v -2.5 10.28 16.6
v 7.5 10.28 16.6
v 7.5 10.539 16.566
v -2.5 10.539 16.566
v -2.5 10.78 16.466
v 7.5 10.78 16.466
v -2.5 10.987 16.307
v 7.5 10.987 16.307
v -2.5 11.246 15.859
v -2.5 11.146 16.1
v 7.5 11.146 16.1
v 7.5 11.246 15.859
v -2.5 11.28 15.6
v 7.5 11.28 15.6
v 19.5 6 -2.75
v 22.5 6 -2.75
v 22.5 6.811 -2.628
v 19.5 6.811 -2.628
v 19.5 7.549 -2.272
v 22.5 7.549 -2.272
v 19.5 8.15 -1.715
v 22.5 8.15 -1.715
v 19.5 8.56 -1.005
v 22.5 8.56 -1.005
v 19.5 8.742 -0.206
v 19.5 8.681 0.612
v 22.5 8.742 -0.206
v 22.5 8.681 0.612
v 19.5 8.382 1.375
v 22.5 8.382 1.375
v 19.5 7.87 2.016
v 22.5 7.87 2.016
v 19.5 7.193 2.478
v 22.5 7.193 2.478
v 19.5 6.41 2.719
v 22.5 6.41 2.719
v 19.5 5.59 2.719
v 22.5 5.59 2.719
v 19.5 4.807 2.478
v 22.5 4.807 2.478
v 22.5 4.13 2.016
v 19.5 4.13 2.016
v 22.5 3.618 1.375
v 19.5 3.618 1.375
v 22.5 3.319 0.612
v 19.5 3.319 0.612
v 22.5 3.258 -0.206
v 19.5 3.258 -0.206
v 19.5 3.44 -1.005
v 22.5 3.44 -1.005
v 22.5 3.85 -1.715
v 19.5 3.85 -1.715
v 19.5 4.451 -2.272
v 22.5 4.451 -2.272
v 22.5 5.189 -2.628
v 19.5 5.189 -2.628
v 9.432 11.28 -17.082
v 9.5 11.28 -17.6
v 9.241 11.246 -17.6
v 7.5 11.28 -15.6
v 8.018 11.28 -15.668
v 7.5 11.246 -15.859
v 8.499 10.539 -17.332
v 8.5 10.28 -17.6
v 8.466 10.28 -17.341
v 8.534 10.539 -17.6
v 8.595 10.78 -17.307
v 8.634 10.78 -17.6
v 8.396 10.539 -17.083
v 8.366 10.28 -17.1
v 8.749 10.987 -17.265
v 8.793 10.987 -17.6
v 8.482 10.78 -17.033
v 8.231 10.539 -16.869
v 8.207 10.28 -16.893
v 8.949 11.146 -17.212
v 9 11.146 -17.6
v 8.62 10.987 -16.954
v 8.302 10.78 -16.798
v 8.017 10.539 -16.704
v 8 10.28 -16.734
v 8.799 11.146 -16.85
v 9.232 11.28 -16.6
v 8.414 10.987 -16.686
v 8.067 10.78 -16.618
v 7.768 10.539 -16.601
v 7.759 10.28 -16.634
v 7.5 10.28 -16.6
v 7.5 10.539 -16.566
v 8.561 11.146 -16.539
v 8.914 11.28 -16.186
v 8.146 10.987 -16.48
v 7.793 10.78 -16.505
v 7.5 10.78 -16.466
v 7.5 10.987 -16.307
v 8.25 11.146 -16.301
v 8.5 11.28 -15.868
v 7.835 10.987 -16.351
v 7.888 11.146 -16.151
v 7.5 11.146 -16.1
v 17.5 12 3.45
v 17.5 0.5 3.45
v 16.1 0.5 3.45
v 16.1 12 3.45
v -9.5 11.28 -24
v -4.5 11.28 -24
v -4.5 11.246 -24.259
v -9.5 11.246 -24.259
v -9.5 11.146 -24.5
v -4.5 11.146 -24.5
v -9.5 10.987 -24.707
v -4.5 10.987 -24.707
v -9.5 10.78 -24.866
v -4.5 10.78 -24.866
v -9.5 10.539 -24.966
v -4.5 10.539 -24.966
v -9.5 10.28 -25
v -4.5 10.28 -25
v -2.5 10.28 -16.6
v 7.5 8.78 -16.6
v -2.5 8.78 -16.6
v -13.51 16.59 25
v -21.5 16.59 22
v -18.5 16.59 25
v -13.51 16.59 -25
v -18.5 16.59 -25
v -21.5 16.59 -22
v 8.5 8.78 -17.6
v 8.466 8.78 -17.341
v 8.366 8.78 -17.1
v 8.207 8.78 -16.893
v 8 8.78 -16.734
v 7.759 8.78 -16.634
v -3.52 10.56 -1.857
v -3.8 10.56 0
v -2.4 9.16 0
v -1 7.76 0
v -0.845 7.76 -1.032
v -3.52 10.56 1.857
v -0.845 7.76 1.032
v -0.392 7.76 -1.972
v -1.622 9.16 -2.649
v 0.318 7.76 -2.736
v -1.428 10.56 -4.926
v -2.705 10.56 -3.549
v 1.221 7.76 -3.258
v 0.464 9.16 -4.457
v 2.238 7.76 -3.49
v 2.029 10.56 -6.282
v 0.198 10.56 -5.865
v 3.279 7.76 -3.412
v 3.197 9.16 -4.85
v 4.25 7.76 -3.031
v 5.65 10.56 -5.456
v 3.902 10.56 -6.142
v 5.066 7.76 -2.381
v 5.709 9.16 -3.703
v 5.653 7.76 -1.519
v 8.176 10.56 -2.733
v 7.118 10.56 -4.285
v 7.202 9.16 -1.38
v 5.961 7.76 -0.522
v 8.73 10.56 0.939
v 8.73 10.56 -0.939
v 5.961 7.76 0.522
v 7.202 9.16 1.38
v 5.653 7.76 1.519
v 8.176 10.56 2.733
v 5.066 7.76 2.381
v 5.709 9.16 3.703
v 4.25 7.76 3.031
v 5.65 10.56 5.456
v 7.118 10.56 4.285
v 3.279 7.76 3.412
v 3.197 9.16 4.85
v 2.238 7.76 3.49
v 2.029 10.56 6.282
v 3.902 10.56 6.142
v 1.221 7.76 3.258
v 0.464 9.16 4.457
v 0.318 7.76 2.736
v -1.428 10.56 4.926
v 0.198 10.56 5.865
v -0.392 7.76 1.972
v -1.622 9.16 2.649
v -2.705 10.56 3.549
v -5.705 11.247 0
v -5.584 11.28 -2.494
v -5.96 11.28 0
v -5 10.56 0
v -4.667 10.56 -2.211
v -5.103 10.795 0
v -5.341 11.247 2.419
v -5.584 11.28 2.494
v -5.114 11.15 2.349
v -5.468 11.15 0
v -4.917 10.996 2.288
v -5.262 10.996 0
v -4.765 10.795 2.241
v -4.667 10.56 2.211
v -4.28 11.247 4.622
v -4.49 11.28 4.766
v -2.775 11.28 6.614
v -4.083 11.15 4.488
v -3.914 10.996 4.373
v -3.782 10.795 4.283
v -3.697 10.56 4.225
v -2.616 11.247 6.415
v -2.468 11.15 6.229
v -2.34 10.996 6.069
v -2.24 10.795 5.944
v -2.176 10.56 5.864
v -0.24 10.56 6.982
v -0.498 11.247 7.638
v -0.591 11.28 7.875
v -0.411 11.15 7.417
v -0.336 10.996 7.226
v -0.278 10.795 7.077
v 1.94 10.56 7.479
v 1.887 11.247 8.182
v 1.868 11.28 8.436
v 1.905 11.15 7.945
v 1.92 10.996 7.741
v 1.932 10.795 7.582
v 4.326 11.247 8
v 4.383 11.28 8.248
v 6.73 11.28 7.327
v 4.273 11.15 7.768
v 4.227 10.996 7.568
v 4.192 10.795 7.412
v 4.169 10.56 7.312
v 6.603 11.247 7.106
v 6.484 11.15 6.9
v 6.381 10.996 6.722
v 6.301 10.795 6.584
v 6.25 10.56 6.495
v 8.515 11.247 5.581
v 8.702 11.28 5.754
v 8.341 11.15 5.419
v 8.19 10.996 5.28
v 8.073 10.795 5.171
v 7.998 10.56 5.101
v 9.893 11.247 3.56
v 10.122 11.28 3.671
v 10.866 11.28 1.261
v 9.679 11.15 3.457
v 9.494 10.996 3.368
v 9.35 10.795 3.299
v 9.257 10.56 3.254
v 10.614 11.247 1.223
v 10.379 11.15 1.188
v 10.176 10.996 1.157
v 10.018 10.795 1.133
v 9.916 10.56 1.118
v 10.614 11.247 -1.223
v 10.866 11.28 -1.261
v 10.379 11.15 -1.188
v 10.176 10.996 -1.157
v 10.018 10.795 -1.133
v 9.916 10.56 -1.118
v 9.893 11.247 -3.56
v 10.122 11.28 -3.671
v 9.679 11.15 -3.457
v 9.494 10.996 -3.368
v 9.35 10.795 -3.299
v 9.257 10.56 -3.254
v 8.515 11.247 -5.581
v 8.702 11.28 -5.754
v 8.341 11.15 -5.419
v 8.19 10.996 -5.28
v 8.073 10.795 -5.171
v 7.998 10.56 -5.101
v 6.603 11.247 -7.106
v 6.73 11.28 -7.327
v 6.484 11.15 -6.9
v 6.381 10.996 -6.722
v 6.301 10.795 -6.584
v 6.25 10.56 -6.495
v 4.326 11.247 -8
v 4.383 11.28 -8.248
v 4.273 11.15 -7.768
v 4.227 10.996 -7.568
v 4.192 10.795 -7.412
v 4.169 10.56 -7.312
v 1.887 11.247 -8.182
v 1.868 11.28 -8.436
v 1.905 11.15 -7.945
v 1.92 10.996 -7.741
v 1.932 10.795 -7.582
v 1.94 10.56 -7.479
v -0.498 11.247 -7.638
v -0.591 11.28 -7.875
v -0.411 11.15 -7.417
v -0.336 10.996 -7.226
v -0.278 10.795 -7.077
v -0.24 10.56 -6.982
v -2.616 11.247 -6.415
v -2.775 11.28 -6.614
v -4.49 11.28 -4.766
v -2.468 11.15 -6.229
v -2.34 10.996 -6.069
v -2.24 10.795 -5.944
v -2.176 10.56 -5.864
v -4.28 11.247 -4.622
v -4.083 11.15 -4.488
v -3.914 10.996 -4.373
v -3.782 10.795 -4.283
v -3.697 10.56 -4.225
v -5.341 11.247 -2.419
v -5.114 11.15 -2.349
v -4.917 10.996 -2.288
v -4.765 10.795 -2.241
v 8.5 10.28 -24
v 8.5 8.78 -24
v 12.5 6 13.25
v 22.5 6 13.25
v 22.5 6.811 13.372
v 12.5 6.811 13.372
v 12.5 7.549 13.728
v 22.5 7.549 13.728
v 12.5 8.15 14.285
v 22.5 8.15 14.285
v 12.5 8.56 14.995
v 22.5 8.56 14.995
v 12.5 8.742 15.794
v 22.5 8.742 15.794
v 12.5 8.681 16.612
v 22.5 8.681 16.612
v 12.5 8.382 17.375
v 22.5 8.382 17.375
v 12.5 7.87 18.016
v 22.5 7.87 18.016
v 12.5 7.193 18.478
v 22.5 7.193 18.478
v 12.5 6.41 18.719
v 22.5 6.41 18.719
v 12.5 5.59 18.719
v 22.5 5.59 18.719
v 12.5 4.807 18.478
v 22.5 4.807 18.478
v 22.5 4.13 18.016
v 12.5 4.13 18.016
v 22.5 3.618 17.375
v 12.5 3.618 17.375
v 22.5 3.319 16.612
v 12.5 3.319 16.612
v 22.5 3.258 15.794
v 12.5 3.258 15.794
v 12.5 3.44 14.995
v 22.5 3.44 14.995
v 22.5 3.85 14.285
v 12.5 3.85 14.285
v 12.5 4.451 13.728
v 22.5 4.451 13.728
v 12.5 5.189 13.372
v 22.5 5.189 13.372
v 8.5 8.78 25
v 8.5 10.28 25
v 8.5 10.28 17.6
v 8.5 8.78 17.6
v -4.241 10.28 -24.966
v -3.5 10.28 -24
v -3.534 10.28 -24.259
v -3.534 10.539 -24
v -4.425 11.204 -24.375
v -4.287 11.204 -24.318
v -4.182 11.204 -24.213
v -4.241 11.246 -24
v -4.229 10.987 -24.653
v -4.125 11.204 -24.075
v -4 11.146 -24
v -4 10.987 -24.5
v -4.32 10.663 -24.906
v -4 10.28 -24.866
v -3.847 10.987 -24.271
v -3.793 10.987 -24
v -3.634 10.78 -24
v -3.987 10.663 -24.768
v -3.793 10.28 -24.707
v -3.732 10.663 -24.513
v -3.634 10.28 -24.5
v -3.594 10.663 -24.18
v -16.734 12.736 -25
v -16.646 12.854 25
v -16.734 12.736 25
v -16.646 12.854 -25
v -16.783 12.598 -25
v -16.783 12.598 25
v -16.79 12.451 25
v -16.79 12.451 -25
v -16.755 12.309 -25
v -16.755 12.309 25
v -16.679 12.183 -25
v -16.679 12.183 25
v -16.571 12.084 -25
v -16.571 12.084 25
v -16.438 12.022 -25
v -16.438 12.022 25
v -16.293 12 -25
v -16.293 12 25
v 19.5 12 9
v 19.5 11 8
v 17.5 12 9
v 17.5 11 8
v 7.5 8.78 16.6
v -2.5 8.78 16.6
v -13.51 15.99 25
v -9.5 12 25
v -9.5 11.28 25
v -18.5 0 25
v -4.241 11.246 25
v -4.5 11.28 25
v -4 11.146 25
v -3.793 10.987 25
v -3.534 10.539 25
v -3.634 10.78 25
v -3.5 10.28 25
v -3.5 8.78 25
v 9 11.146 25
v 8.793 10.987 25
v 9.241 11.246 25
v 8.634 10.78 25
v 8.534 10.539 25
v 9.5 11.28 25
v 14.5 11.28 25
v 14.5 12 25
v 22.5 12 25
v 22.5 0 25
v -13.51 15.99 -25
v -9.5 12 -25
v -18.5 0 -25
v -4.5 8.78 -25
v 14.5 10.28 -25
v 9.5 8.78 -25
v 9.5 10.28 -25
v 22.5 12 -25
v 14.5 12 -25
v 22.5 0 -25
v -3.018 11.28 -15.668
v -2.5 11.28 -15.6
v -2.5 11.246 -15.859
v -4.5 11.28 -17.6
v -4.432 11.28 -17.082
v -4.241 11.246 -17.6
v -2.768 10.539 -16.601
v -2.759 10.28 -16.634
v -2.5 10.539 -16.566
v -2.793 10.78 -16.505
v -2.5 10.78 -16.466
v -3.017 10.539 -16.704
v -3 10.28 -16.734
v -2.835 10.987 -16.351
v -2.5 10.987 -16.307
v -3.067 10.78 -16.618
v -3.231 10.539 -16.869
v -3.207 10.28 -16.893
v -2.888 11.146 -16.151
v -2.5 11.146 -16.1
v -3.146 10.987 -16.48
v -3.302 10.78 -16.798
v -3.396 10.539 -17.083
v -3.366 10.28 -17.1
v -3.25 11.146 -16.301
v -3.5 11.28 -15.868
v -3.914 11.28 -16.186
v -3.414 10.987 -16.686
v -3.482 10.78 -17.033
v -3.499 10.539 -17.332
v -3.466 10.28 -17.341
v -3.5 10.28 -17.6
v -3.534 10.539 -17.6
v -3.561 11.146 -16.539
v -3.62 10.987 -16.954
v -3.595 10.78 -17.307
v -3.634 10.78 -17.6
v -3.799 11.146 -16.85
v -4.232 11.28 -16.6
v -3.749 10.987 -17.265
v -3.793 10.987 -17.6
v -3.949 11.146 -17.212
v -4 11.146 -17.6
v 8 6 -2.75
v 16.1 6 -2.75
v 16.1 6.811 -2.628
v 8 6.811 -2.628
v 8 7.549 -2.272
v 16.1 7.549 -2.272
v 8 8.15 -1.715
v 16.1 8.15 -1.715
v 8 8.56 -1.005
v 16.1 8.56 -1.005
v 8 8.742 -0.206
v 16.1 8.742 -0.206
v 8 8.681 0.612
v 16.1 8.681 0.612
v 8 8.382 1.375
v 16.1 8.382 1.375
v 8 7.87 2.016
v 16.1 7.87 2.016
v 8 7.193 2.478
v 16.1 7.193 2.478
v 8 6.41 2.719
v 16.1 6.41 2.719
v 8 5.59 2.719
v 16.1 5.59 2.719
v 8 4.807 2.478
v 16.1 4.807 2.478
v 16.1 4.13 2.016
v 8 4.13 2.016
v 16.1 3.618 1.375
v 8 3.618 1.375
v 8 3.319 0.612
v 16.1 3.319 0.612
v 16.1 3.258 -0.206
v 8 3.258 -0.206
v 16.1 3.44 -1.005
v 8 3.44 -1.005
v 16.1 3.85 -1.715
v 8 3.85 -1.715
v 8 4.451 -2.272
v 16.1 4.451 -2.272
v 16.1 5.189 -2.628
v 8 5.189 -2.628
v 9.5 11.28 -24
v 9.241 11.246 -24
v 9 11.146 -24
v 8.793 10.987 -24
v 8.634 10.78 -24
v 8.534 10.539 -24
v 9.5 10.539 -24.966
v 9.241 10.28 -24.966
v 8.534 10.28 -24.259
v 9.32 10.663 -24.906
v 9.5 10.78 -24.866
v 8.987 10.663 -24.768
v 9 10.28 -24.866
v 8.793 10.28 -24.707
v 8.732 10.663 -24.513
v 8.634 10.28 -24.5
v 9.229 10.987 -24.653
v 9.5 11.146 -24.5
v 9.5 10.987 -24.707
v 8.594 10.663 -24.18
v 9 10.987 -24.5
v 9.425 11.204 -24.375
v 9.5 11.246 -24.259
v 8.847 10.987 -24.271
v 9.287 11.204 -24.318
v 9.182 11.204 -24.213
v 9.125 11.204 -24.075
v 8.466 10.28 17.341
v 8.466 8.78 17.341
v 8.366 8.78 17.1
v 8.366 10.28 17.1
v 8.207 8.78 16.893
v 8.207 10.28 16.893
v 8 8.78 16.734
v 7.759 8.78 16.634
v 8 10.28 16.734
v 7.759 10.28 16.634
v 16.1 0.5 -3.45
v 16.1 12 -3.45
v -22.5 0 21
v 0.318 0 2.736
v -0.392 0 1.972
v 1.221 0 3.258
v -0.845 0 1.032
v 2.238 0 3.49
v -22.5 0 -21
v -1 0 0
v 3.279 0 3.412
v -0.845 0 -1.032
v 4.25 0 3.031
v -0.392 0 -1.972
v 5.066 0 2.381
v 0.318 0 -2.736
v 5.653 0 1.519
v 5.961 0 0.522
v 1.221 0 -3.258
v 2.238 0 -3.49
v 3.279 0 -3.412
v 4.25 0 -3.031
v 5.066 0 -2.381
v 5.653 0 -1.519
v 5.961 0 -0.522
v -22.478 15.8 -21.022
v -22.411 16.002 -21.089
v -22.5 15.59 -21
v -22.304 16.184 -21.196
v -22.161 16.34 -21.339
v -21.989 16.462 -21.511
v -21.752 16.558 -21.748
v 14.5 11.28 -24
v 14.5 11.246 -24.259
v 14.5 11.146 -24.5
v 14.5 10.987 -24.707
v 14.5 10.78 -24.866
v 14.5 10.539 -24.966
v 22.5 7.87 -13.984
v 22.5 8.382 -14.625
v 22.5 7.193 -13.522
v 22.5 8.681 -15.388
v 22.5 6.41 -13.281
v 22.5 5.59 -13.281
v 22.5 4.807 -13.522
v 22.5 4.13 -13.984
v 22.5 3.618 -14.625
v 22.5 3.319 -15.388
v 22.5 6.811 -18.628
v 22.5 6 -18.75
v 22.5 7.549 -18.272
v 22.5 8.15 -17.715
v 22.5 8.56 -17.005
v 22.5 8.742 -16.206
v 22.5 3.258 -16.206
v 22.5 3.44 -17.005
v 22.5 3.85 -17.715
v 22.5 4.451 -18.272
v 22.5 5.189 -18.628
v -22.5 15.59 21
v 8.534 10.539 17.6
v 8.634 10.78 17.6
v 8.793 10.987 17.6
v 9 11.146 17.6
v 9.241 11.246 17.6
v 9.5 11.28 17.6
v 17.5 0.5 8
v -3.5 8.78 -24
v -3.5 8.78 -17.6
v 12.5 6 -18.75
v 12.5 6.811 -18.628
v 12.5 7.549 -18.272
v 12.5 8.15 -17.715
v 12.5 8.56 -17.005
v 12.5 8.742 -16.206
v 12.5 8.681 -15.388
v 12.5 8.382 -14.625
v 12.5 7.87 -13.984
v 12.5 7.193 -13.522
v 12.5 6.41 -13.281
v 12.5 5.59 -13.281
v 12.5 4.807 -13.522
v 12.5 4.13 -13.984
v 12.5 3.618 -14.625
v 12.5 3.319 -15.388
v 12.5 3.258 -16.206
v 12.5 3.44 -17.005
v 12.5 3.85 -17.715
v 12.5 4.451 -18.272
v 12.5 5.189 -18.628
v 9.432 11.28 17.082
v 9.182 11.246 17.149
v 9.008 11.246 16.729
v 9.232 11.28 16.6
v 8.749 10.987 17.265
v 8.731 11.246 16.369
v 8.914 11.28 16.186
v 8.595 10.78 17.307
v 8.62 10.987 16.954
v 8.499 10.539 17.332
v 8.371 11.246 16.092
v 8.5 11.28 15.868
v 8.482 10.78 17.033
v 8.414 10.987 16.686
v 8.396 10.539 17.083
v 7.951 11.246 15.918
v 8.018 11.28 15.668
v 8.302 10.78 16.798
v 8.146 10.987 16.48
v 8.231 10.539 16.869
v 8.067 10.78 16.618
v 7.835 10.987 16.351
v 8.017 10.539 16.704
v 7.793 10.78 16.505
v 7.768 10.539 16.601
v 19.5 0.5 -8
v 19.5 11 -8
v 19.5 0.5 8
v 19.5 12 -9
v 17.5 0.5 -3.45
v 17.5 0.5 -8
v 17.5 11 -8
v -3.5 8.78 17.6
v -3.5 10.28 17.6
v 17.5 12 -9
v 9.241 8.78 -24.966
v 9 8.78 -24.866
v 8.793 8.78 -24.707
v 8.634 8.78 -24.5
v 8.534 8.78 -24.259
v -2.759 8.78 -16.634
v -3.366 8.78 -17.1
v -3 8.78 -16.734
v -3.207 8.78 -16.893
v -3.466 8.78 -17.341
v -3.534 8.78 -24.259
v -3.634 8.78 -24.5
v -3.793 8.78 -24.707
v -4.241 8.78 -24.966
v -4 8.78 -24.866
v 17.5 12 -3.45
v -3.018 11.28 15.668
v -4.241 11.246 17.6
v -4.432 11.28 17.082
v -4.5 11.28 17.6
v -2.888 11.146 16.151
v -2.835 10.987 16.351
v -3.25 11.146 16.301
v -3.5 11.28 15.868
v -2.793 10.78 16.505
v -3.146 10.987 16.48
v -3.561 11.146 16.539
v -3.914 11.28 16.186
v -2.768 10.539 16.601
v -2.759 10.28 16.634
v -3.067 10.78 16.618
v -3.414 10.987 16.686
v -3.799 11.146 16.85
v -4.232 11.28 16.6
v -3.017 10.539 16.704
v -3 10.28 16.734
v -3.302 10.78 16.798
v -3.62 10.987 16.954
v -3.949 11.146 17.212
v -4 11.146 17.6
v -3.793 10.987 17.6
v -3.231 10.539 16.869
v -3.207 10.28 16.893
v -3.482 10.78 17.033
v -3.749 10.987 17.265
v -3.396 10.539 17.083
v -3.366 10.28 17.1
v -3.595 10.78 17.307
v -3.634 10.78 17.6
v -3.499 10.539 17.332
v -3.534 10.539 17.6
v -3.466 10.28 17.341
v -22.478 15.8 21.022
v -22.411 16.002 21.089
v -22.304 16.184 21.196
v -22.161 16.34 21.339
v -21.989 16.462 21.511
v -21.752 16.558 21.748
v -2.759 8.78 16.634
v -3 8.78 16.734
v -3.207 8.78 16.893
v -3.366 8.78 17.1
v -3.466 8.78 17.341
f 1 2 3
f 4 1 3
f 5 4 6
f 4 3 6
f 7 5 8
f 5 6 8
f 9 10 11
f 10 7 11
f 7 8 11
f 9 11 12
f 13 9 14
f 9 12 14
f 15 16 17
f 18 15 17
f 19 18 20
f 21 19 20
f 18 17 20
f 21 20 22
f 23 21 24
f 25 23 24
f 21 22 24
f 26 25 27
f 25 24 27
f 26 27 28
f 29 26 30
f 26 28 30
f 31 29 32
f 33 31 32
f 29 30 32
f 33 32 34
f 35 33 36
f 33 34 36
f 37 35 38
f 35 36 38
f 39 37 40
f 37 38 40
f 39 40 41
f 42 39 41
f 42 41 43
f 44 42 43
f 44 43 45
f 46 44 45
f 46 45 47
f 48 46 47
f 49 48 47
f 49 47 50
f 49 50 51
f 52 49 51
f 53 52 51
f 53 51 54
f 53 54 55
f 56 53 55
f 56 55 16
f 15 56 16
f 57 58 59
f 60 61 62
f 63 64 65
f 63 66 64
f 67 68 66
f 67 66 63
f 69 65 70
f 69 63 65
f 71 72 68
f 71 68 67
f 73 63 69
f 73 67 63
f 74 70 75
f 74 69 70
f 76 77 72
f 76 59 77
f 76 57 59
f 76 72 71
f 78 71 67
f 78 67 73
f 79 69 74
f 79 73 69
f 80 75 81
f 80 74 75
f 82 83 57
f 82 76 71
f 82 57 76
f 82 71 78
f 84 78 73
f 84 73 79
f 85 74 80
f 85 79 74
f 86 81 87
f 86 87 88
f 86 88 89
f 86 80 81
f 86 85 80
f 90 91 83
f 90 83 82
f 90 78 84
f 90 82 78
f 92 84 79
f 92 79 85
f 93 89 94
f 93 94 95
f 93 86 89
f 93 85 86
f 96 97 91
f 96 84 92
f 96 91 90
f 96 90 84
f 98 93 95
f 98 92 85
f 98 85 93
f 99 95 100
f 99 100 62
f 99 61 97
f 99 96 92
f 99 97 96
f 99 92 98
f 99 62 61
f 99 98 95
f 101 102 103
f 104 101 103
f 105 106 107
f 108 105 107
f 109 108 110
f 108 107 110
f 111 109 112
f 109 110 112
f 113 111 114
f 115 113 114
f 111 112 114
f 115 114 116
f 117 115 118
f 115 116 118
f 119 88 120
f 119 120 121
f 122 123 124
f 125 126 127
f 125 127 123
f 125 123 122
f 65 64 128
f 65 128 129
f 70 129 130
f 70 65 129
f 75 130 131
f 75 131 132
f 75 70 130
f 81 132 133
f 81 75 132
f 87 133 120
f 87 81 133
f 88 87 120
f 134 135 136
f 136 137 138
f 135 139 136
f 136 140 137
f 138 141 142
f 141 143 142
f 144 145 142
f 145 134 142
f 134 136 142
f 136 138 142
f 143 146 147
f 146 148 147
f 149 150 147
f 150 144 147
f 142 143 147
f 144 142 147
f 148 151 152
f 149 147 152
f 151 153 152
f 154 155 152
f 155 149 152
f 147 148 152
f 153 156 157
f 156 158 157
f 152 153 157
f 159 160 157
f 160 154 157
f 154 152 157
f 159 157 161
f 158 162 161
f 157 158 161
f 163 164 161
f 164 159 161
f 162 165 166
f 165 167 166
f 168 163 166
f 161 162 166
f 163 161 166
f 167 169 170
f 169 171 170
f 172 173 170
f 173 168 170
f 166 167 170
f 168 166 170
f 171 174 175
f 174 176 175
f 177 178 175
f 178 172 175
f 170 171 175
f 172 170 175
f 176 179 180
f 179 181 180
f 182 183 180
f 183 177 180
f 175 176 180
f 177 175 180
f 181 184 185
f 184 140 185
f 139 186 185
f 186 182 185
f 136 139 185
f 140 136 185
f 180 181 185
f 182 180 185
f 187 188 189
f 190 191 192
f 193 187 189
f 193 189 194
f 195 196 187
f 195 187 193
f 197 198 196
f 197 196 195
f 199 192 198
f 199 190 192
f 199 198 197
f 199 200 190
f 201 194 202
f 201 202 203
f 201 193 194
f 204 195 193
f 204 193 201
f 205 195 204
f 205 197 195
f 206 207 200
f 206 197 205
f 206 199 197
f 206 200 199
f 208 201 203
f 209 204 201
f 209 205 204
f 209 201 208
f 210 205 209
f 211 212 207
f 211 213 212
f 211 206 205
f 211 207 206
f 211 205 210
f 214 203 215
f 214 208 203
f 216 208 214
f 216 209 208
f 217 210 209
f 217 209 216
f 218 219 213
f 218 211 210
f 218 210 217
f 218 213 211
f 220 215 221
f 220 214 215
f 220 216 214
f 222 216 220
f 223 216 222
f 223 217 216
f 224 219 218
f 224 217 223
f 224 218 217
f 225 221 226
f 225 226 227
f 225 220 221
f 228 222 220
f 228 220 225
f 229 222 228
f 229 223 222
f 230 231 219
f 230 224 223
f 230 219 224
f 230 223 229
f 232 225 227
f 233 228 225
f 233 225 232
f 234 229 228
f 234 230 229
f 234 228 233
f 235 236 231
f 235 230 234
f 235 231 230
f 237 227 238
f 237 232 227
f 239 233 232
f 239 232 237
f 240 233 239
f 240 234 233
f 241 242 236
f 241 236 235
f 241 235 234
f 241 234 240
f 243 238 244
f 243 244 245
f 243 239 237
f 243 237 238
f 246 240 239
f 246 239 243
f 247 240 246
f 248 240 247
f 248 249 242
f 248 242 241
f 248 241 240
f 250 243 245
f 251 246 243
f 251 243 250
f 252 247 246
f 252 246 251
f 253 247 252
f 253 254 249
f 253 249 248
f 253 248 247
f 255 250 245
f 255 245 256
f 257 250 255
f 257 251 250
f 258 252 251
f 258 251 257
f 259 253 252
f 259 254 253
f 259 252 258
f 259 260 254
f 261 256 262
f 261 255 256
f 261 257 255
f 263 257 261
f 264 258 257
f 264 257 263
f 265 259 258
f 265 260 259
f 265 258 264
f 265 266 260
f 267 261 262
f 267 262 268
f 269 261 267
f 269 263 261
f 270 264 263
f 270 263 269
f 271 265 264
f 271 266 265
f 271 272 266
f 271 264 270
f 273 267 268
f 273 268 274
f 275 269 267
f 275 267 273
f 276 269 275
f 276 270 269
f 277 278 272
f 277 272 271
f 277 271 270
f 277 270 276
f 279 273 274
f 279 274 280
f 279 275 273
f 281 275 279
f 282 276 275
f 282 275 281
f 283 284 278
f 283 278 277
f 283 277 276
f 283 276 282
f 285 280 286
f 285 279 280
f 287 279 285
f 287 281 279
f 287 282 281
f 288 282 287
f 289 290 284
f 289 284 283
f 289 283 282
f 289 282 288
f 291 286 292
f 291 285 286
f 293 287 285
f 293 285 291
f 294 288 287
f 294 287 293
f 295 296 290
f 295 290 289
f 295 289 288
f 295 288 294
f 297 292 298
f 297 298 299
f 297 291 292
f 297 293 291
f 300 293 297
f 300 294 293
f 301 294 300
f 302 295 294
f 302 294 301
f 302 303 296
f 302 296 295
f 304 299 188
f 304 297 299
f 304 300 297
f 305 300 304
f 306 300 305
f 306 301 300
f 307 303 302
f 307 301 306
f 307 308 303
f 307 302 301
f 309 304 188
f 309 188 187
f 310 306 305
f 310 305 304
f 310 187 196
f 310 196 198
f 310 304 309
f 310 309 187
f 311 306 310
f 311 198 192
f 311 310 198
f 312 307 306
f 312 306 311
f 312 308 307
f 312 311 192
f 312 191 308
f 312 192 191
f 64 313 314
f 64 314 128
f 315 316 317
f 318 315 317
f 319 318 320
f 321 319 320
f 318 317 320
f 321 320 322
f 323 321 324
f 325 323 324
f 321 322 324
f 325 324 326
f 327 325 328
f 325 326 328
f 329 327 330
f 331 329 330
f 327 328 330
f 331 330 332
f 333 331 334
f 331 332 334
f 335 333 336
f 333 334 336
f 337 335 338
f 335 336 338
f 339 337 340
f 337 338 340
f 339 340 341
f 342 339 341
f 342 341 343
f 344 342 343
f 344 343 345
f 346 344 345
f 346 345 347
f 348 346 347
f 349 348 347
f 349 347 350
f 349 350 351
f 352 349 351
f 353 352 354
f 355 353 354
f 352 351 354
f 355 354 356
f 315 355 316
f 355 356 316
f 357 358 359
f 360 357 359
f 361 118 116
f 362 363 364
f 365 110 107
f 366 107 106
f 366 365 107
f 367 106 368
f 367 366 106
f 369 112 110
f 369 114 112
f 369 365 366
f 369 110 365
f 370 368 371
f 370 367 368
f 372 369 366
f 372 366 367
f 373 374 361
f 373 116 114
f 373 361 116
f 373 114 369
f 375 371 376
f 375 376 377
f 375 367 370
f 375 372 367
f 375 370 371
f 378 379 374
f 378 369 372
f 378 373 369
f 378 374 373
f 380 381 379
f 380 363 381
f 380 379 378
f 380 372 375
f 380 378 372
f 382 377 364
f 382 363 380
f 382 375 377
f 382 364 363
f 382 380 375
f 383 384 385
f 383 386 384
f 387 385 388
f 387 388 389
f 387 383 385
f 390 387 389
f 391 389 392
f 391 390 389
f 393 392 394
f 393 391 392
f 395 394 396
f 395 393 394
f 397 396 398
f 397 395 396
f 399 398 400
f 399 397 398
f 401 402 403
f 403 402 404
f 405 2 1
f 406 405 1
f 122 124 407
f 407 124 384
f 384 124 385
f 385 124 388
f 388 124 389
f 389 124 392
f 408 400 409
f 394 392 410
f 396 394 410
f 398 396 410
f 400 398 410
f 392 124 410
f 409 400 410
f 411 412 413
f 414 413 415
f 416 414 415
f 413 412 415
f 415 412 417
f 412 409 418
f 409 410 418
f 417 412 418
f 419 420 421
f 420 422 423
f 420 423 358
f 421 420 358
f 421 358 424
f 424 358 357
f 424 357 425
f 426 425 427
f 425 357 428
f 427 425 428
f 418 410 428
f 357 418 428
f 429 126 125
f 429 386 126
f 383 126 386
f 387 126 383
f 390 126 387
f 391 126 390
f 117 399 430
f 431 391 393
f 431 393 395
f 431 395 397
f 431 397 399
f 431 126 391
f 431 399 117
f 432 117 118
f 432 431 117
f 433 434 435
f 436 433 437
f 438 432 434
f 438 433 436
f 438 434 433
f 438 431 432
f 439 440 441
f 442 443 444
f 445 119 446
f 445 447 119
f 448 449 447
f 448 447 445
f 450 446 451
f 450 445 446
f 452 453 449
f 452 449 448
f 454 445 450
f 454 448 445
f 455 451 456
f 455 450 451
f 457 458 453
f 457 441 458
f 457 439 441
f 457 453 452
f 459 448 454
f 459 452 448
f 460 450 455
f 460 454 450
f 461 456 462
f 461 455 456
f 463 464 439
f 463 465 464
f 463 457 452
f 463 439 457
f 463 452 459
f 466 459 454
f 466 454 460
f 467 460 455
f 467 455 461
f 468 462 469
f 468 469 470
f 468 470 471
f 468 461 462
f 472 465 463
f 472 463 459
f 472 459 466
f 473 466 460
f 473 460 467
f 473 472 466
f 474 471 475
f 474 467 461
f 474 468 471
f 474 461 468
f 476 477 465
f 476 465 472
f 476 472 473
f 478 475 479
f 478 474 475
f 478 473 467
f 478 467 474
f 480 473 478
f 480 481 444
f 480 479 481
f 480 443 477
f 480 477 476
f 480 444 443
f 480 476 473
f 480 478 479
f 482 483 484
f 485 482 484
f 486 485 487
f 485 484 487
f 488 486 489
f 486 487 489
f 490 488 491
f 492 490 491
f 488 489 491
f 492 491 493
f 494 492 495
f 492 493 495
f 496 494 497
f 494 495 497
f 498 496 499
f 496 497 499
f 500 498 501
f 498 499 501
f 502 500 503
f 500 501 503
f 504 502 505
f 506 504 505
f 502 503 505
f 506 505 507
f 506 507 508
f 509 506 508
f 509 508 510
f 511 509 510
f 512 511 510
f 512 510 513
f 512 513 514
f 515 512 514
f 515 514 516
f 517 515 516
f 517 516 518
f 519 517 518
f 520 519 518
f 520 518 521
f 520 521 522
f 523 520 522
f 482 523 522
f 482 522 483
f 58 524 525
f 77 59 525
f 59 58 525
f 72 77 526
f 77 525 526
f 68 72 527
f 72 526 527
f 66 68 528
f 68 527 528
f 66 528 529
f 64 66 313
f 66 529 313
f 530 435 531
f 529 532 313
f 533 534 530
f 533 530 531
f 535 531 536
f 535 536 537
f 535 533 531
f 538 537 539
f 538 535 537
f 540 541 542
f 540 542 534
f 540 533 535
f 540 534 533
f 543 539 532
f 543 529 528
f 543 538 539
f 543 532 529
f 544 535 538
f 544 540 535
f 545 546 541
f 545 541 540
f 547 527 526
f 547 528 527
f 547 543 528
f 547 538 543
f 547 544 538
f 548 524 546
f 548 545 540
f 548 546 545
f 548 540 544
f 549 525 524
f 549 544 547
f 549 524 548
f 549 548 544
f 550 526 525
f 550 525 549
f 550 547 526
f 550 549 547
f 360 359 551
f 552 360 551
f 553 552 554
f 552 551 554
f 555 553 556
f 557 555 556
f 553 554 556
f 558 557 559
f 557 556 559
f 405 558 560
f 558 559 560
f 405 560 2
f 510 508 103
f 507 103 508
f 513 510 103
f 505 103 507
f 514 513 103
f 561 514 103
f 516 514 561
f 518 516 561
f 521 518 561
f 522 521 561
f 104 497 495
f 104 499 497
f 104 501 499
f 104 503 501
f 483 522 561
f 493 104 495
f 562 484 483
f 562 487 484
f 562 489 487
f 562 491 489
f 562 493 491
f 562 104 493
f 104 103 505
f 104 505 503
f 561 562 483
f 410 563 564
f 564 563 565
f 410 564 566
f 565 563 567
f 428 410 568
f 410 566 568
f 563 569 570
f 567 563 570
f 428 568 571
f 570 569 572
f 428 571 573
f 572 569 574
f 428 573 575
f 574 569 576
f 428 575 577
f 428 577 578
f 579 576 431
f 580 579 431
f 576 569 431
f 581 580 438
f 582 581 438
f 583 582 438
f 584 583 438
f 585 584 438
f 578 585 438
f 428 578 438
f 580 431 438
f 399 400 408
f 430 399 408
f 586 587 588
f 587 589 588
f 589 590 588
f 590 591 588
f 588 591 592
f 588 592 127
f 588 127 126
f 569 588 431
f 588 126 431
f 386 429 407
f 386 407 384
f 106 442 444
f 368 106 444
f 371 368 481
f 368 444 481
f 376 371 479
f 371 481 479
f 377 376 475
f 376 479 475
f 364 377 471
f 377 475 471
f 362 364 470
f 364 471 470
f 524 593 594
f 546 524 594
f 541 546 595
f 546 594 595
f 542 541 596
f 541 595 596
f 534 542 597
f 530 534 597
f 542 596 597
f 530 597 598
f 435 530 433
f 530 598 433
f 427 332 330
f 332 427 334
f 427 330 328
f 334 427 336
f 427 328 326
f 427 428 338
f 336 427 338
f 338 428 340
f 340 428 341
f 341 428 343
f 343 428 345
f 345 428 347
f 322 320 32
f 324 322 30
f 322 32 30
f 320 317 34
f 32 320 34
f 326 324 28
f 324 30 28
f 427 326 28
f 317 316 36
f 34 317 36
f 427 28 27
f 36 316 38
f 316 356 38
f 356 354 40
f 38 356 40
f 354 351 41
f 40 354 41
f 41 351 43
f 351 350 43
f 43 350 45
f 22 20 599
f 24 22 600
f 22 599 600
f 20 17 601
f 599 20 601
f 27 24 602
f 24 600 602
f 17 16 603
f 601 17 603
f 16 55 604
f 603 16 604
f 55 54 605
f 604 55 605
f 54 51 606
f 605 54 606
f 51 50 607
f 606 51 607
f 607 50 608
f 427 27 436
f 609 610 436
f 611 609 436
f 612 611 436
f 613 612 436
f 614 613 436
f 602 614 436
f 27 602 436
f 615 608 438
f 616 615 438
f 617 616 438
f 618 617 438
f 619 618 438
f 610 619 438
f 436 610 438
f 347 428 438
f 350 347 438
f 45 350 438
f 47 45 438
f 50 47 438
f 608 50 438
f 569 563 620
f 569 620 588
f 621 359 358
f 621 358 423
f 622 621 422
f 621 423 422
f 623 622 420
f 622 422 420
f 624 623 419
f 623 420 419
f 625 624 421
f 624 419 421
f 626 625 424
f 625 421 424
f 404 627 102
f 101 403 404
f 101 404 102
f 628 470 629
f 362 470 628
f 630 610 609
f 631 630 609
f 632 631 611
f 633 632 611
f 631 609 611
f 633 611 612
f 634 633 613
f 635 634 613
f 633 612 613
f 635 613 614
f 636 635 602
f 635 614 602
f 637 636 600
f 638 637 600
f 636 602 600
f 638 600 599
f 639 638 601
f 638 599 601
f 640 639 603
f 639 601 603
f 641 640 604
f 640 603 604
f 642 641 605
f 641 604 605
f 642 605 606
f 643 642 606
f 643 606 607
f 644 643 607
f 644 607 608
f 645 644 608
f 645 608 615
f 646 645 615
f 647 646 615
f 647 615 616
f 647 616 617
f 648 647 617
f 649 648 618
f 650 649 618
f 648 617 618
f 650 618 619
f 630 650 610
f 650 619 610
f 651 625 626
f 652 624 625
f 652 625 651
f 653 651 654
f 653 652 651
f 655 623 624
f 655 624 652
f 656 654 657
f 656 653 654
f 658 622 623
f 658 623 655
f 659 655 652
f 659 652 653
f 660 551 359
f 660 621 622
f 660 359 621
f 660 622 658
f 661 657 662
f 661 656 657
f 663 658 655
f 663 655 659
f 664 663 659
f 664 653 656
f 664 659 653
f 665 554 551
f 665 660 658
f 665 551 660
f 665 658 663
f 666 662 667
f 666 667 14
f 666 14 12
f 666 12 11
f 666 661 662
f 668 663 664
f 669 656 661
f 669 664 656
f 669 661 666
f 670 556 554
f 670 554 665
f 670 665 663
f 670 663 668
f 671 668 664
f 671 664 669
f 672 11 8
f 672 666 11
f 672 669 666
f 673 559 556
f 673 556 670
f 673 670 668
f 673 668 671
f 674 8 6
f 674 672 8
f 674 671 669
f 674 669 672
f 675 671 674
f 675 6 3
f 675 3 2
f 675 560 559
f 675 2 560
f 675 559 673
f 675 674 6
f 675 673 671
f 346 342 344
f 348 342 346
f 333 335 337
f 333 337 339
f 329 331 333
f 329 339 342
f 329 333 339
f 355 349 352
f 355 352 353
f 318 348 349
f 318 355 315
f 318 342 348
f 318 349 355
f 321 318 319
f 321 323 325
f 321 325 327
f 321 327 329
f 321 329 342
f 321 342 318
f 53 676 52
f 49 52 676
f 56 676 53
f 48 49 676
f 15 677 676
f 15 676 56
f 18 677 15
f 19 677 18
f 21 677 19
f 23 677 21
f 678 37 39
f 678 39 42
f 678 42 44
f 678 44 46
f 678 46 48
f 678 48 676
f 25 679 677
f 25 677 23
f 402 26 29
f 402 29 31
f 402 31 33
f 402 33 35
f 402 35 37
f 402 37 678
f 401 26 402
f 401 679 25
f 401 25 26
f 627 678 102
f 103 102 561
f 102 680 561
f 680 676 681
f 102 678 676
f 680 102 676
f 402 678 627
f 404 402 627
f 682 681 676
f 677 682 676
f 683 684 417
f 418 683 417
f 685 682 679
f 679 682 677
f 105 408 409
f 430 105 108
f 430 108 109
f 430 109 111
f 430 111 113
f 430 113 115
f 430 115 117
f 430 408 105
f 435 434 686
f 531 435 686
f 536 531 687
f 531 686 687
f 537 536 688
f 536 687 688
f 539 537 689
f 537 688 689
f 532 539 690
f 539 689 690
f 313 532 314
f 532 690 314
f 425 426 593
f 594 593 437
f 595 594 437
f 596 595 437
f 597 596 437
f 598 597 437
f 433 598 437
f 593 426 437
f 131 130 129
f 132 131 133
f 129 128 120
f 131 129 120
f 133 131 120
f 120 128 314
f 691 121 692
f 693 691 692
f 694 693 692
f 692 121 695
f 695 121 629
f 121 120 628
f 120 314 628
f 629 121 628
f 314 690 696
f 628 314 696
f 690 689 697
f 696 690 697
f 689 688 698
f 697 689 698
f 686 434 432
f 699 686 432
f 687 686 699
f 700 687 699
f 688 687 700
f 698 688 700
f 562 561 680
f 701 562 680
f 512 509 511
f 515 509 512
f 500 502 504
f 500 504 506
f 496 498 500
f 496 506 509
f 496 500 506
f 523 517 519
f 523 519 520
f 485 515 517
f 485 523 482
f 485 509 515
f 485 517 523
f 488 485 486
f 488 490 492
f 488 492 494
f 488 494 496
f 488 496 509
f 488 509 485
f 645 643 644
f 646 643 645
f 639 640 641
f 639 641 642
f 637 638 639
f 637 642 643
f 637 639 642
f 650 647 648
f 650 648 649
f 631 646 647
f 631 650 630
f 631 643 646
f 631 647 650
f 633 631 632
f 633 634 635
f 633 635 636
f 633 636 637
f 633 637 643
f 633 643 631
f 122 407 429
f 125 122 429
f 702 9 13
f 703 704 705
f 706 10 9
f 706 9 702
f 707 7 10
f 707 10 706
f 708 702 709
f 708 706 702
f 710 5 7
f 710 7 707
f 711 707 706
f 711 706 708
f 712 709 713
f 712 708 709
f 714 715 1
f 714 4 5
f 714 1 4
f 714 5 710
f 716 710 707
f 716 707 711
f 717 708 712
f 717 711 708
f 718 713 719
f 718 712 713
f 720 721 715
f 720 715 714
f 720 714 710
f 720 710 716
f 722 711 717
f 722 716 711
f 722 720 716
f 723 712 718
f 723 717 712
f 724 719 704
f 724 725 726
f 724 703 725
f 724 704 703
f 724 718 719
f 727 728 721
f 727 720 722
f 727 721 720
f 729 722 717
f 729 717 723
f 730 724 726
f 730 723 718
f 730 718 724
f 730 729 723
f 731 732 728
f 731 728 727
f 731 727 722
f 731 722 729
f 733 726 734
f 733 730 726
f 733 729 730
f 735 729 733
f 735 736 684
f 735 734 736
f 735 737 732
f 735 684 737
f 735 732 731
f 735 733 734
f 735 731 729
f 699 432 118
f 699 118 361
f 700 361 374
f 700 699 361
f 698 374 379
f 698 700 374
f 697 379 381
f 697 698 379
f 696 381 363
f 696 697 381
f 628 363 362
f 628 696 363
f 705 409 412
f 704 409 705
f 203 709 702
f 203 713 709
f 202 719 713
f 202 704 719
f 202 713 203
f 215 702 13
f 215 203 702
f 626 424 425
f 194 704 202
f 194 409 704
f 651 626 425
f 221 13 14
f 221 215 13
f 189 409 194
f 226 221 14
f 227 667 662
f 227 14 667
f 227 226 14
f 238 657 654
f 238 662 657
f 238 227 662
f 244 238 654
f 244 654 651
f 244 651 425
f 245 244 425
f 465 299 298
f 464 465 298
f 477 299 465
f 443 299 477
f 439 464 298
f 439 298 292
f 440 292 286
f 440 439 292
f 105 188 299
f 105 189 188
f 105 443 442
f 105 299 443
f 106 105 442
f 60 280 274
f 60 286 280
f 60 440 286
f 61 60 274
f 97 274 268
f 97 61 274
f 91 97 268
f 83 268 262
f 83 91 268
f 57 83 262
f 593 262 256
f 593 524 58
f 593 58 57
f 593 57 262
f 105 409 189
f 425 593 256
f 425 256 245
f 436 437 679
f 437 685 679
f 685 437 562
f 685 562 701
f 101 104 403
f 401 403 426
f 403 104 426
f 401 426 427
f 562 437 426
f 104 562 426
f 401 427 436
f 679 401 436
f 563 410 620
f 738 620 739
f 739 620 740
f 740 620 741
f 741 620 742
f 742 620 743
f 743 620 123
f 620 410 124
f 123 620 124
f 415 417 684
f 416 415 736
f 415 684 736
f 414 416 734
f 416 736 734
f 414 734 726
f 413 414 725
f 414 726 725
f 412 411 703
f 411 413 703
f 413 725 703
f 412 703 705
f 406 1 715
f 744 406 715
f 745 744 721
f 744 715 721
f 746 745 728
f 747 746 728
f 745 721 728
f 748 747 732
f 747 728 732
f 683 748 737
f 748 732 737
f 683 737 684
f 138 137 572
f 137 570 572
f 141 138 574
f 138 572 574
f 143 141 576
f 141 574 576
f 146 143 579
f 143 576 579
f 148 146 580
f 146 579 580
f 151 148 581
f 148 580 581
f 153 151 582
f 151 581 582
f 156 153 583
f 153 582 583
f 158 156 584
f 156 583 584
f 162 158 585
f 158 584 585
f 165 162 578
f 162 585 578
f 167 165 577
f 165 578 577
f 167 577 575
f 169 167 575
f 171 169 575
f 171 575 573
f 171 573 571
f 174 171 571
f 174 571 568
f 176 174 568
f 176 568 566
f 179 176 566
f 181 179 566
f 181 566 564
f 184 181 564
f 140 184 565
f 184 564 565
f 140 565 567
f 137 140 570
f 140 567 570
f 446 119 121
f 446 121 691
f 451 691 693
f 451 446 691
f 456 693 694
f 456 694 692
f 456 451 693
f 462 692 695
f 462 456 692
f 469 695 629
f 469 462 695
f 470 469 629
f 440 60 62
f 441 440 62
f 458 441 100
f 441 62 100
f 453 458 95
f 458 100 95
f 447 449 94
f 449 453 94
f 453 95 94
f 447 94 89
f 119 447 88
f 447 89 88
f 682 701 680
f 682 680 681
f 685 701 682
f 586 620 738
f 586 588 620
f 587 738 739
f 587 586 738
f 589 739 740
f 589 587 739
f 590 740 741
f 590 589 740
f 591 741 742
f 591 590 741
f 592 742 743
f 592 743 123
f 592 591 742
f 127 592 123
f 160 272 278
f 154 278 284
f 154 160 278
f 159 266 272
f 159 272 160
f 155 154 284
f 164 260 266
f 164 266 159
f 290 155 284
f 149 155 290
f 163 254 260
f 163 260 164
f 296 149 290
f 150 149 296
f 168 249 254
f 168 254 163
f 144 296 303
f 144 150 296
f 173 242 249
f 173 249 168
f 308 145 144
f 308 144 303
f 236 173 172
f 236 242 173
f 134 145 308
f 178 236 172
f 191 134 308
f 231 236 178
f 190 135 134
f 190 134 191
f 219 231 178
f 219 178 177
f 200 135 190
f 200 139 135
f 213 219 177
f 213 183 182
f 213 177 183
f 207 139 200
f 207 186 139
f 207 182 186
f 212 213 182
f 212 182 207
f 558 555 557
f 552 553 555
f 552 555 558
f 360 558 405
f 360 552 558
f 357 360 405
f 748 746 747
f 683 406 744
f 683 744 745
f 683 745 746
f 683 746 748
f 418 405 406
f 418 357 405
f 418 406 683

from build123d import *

# Parameters (mm, degrees)
SKETCH1_W                                       = 45
SKETCH1_H                                       = 50
BOSS_EXTRUDE1_DEPTH                             = 16
CUT_EXTRUDE1_DEPTH                              = 58.116109812
SKETCH4_W                                       = 24
SKETCH4_H                                       = 50
CUT_EXTRUDE2_DEPTH                              = 0.72
CUT_EXTRUDE3_DEPTH                              = 58.116109812
SKETCH8_R                                       = 7.5
CUT_EXTRUDE4_DEPTH                              = 0.72
CSK_FOR_M6_FLAT_HEAD_MACHINE_SCREW1_D           = 7
CSK_FOR_M6_FLAT_HEAD_MACHINE_SCREW1_CSINK_D     = 12.6
CSK_FOR_M6_FLAT_HEAD_MACHINE_SCREW1_CSINK_ANGLE = 90
CUT_EXTRUDE5_DEPTH                              = 2.5
FILLET1_R                                       = 1
FILLET2_R                                       = 1
FILLET4_R                                       = 0.5
CUT_EXTRUDE7_DEPTH                              = 11.5
SKETCH18_R                                      = 2.75
CUT_EXTRUDE8_DEPTH                              = 14.5
SKETCH19_R                                      = 2.75
CUT_EXTRUDE9_DEPTH                              = 10
SKETCH21_W                                      = 8.99
SKETCH21_H                                      = 50
BOSS_EXTRUDE2_DEPTH                             = 0.6
CHAMFER1_SIZE                                   = 4
FILLET5_R                                       = 1
CHAMFER2_SIZE                                   = 1


with BuildPart() as part:
    # Sketch1 → Boss-Extrude1 (new body)
    with BuildSketch(Plane(origin=(0, 0, 0), x_dir=(1, 0, 0), z_dir=(0, 1, 0))):
        Rectangle(SKETCH1_W, SKETCH1_H)
    extrude(amount=BOSS_EXTRUDE1_DEPTH)

    # Sketch3 → Cut-Extrude1 (cut, through all)
    with BuildSketch(Plane.XY.offset(25)):
        Polygon((-13.5, 16), (-17.5, 12), (22.5, 12), (22.5, 16), align=None)
    extrude(amount=-CUT_EXTRUDE1_DEPTH, mode=Mode.SUBTRACT)

    # Sketch4 → Cut-Extrude2 (cut)
    with BuildSketch(Plane(origin=(0, 12, 0), x_dir=(1, 0, 0), z_dir=(0, 1, 0))):
        with Locations((2.5, 0)):
            Rectangle(SKETCH4_W, SKETCH4_H)
    extrude(amount=-CUT_EXTRUDE2_DEPTH, mode=Mode.SUBTRACT)

    # Sketch5 → Cut-Extrude3 (cut, through all)
    with BuildSketch(Plane.XY.offset(25)):
        Polygon((-22.5, 16), (-13.5, 16), (-13.51, 15.99), (-22.5, 15.99), align=None)
    extrude(amount=-CUT_EXTRUDE3_DEPTH, mode=Mode.SUBTRACT)

    # Sketch8 → Cut-Extrude4 (cut)
    with BuildSketch(Plane(origin=(0, 11.28, 0), x_dir=(1, 0, 0), z_dir=(0, 1, 0))):
        with Locations(Location((2.5, 0, 0), (0, 0, 180))):
            Circle(SKETCH8_R)
    extrude(amount=-CUT_EXTRUDE4_DEPTH, mode=Mode.SUBTRACT)

    # CSK for M6 Flat Head Machine Screw1 (through all)
    with Locations(Plane(origin=(0, 10.56, 0), x_dir=(1, 0, 0), z_dir=(0, 1, 0))):
        with Locations((2.5, 0)):
            CounterSinkHole(CSK_FOR_M6_FLAT_HEAD_MACHINE_SCREW1_D / 2, CSK_FOR_M6_FLAT_HEAD_MACHINE_SCREW1_CSINK_D / 2, counter_sink_angle=CSK_FOR_M6_FLAT_HEAD_MACHINE_SCREW1_CSINK_ANGLE)

    # Sketch12 → Cut-Extrude5 (cut)
    with BuildSketch(Plane(origin=(0, 11.28, 0), x_dir=(1, 0, 0), z_dir=(0, 1, 0))):
        with BuildLine():
            Line((7.5, 16.6), (-2.5, 16.6))
            ThreePointArc((-2.5, 16.6), (-3.207106781, 16.892893219), (-3.5, 17.6))
            Line((-3.5, 17.6), (-3.5, 25))
            Line((-3.5, 25), (8.5, 25))
            Line((8.5, 25), (8.5, 17.6))
            ThreePointArc((8.5, 17.6), (8.207106781, 16.892893219), (7.5, 16.6))
        make_face()
    cut_extrude5 = extrude(amount=-CUT_EXTRUDE5_DEPTH, mode=Mode.SUBTRACT)

    # Fillet1
    fillet1_edges = [part.edges().sort_by_distance(p)[0] for p in [
        (-3.5, 10.03, -25),
        (8.5, 10.03, -25),
    ]]
    fillet(fillet1_edges, radius=FILLET1_R)

    # Mirror2: Cut-Extrude5 across plane
    add(cut_extrude5.mirror(Plane.XY), mode=Mode.SUBTRACT)

    # Fillet2
    # the kernel refuses this fillet: 1 mm, written as the material it takes off along each edge
    with BuildSketch(Plane(origin=(7.5, 11.28, 17.6), x_dir=(1, 0, 0), z_dir=(0, 0, 1))) as fillet2_piece_1:
        with BuildLine():
            CenterArc((1 + FILLET2_R, -FILLET2_R), FILLET2_R, 90, 90)
            Line((1, -FILLET2_R), (1 - FILLET2_R * 0.02, -FILLET2_R))
            Line((1 - FILLET2_R * 0.02, -FILLET2_R), (1 - FILLET2_R * 0.02, FILLET2_R * 0.02))
            Line((1 - FILLET2_R * 0.02, FILLET2_R * 0.02), (1 + FILLET2_R, FILLET2_R * 0.02))
            Line((1 + FILLET2_R, FILLET2_R * 0.02), (1 + FILLET2_R, 0))
        make_face()
    revolve(axis=Axis((7.5, 11.28, 17.6), (0, 1, 0)), revolution_arc=90, mode=Mode.SUBTRACT)
    with BuildSketch(Plane(origin=(8.5, 11.28, 27.5), x_dir=(1, 0, 0), z_dir=(0, 0, -1)), Plane(origin=(-3.5, 11.28, 17.6), x_dir=(-1, 0, 0), z_dir=(0, 0, 1))) as fillet2_piece_2:
        with BuildLine():
            CenterArc((FILLET2_R, FILLET2_R), FILLET2_R, 180, 90)
            Line((0, FILLET2_R), (-FILLET2_R * 0.02, FILLET2_R))
            Line((-FILLET2_R * 0.02, FILLET2_R), (-FILLET2_R * 0.02, -FILLET2_R * 0.02))
            Line((-FILLET2_R * 0.02, -FILLET2_R * 0.02), (FILLET2_R, -FILLET2_R * 0.02))
            Line((FILLET2_R, -FILLET2_R * 0.02), (FILLET2_R, 0))
        make_face()
    extrude(amount=9.9, mode=Mode.SUBTRACT)
    with BuildSketch(Plane(origin=(-2.5, 11.28, 17.6), x_dir=(0, 0, -1), z_dir=(1, 0, 0))) as fillet2_piece_3:
        with BuildLine():
            CenterArc((1 + FILLET2_R, -FILLET2_R), FILLET2_R, 90, 90)
            Line((1, -FILLET2_R), (1 - FILLET2_R * 0.02, -FILLET2_R))
            Line((1 - FILLET2_R * 0.02, -FILLET2_R), (1 - FILLET2_R * 0.02, FILLET2_R * 0.02))
            Line((1 - FILLET2_R * 0.02, FILLET2_R * 0.02), (1 + FILLET2_R, FILLET2_R * 0.02))
            Line((1 + FILLET2_R, FILLET2_R * 0.02), (1 + FILLET2_R, 0))
        make_face()
    revolve(axis=Axis((-2.5, 11.28, 17.6), (0, 1, 0)), revolution_arc=90, mode=Mode.SUBTRACT)
    with BuildSketch(Plane(origin=(7.5, 11.28, 16.6), x_dir=(0, 0, -1), z_dir=(-1, 0, 0))) as fillet2_piece_4:
        with BuildLine():
            CenterArc((FILLET2_R, FILLET2_R), FILLET2_R, 180, 90)
            Line((0, FILLET2_R), (-FILLET2_R * 0.02, FILLET2_R))
            Line((-FILLET2_R * 0.02, FILLET2_R), (-FILLET2_R * 0.02, -FILLET2_R * 0.02))
            Line((-FILLET2_R * 0.02, -FILLET2_R * 0.02), (FILLET2_R, -FILLET2_R * 0.02))
            Line((FILLET2_R, -FILLET2_R * 0.02), (FILLET2_R, 0))
        make_face()
    extrude(amount=10, mode=Mode.SUBTRACT)
    with BuildSketch(Plane(origin=(-4.5, 11.28, -25), x_dir=(0, 0, 1), z_dir=(-1, 0, 0)), Plane(origin=(14.5, 11.28, -25), x_dir=(0, 0, 1), z_dir=(-1, 0, 0))) as fillet2_piece_5:
        with BuildLine():
            CenterArc((FILLET2_R, -FILLET2_R), FILLET2_R, 90, 90)
            Line((0, -FILLET2_R), (-FILLET2_R * 0.02, -FILLET2_R))
            Line((-FILLET2_R * 0.02, -FILLET2_R), (-FILLET2_R * 0.02, FILLET2_R * 0.02))
            Line((-FILLET2_R * 0.02, FILLET2_R * 0.02), (FILLET2_R, FILLET2_R * 0.02))
            Line((FILLET2_R, FILLET2_R * 0.02), (FILLET2_R, 0))
        make_face()
    extrude(amount=5, mode=Mode.SUBTRACT)
    with BuildSketch(Plane(origin=(2.5, 11.28, 0), x_dir=(-1, 0, 0), z_dir=(0, 0, -1))) as fillet2_piece_6:
        with BuildLine():
            CenterArc((8.46, -1), FILLET2_R, 90, 73.739795292)
            Line((7.5, -0.72), (7.4808, -0.7144))
            ThreePointArc((7.4808, -0.7144), (7.48, -0.36), (7.48, 0))
            Line((7.48, 0), (7.5, 0.02))
            Line((7.5, 0.02), (8.46, 0.02))
            Line((8.46, 0.02), (8.46, 0))
        make_face()
    revolve(axis=Axis((2.5, 11.28, 0), (0, 1, 0)), mode=Mode.SUBTRACT)
    with BuildSketch(Plane(origin=(7.5, 11.28, -17.6), x_dir=(1, 0, 0), z_dir=(0, 0, -1))) as fillet2_piece_7:
        with BuildLine():
            CenterArc((1 + FILLET2_R, FILLET2_R), FILLET2_R, 180, 90)
            Line((1, FILLET2_R), (1 - FILLET2_R * 0.02, FILLET2_R))
            Line((1 - FILLET2_R * 0.02, FILLET2_R), (1 - FILLET2_R * 0.02, -FILLET2_R * 0.02))
            Line((1 - FILLET2_R * 0.02, -FILLET2_R * 0.02), (1 + FILLET2_R, -FILLET2_R * 0.02))
            Line((1 + FILLET2_R, -FILLET2_R * 0.02), (1 + FILLET2_R, 0))
        make_face()
    revolve(axis=Axis((7.5, 11.28, -17.6), (0, -1, 0)), revolution_arc=90, mode=Mode.SUBTRACT)
    with BuildSketch(Plane(origin=(8.5, 11.28, -24), x_dir=(1, 0, 0), z_dir=(0, 0, 1)), Plane(origin=(-3.5, 11.28, -17.6), x_dir=(-1, 0, 0), z_dir=(0, 0, -1))) as fillet2_piece_8:
        with BuildLine():
            CenterArc((FILLET2_R, -FILLET2_R), FILLET2_R, 90, 90)
            Line((0, -FILLET2_R), (-FILLET2_R * 0.02, -FILLET2_R))
            Line((-FILLET2_R * 0.02, -FILLET2_R), (-FILLET2_R * 0.02, FILLET2_R * 0.02))
            Line((-FILLET2_R * 0.02, FILLET2_R * 0.02), (FILLET2_R, FILLET2_R * 0.02))
            Line((FILLET2_R, FILLET2_R * 0.02), (FILLET2_R, 0))
        make_face()
    extrude(amount=6.4, mode=Mode.SUBTRACT)
    with BuildSketch(Plane(origin=(-2.5, 11.28, -17.6), x_dir=(0, 0, 1), z_dir=(1, 0, 0))) as fillet2_piece_9:
        with BuildLine():
            CenterArc((1 + FILLET2_R, FILLET2_R), FILLET2_R, 180, 90)
            Line((1, FILLET2_R), (1 - FILLET2_R * 0.02, FILLET2_R))
            Line((1 - FILLET2_R * 0.02, FILLET2_R), (1 - FILLET2_R * 0.02, -FILLET2_R * 0.02))
            Line((1 - FILLET2_R * 0.02, -FILLET2_R * 0.02), (1 + FILLET2_R, -FILLET2_R * 0.02))
            Line((1 + FILLET2_R, -FILLET2_R * 0.02), (1 + FILLET2_R, 0))
        make_face()
    revolve(axis=Axis((-2.5, 11.28, -17.6), (0, -1, 0)), revolution_arc=90, mode=Mode.SUBTRACT)
    with BuildSketch(Plane(origin=(7.5, 11.28, -16.6), x_dir=(0, 0, 1), z_dir=(-1, 0, 0))) as fillet2_piece_10:
        with BuildLine():
            CenterArc((FILLET2_R, -FILLET2_R), FILLET2_R, 90, 90)
            Line((0, -FILLET2_R), (-FILLET2_R * 0.02, -FILLET2_R))
            Line((-FILLET2_R * 0.02, -FILLET2_R), (-FILLET2_R * 0.02, FILLET2_R * 0.02))
            Line((-FILLET2_R * 0.02, FILLET2_R * 0.02), (FILLET2_R, FILLET2_R * 0.02))
            Line((FILLET2_R, FILLET2_R * 0.02), (FILLET2_R, 0))
        make_face()
    extrude(amount=10, mode=Mode.SUBTRACT)
    with BuildSketch(Plane(origin=(-4.5, 11.28, -24), x_dir=(0, 0, -1), z_dir=(-1, 0, 0))) as fillet2_piece_11:
        with BuildLine():
            CenterArc((1 - FILLET2_R, FILLET2_R), FILLET2_R, 270, 90)
            Line((1, FILLET2_R), (1 + FILLET2_R * 0.02, FILLET2_R))
            Line((1 + FILLET2_R * 0.02, FILLET2_R), (1 + FILLET2_R * 0.02, 0))
            Line((1 + FILLET2_R * 0.02, 0), (1, -FILLET2_R * 0.02))
            Line((1, -FILLET2_R * 0.02), (1 - FILLET2_R, -FILLET2_R * 0.02))
            Line((1 - FILLET2_R, -FILLET2_R * 0.02), (1 - FILLET2_R, 0))
        make_face()
    revolve(axis=Axis((-4.5, 11.28, -24), (0, -1, 0)), revolution_arc=90, mode=Mode.SUBTRACT)
    with BuildSketch(Plane(origin=(9.5, 11.28, -24), x_dir=(0, 0, -1), z_dir=(1, 0, 0))) as fillet2_piece_12:
        with BuildLine():
            CenterArc((1 - FILLET2_R, -FILLET2_R), FILLET2_R, 0, 90)
            Line((1, -FILLET2_R), (1 + FILLET2_R * 0.02, -FILLET2_R))
            Line((1 + FILLET2_R * 0.02, -FILLET2_R), (1 + FILLET2_R * 0.02, 0))
            Line((1 + FILLET2_R * 0.02, 0), (1, FILLET2_R * 0.02))
            Line((1, FILLET2_R * 0.02), (1 - FILLET2_R, FILLET2_R * 0.02))
            Line((1 - FILLET2_R, FILLET2_R * 0.02), (1 - FILLET2_R, 0))
        make_face()
    revolve(axis=Axis((9.5, 11.28, -24), (0, 1, 0)), revolution_arc=90, mode=Mode.SUBTRACT)

    # Fillet4
    fillet4_edges = [part.edges().sort_by_distance(p)[0] for p in [
        (-17.5, 12, 0),
    ]]
    fillet(fillet4_edges, radius=FILLET4_R)

    # Sketch14 → Cut-Extrude7 (cut)
    with BuildSketch(Plane(origin=(0, 12, 0), x_dir=(1, 0, 0), z_dir=(0, 1, 0))):
        Polygon((19.5, -8), (17.5, -8), (17.5, -3.45), (16.1, -3.45), (16.1, 3.45), (17.5, 3.45), (17.5, 8), (19.5, 8), align=None)
    extrude(amount=-CUT_EXTRUDE7_DEPTH, mode=Mode.SUBTRACT)

    # Sketch18 → Cut-Extrude8 (cut)
    with BuildSketch(Plane(origin=(22.5, 0, 0), x_dir=(0, 0, -1), z_dir=(1, 0, 0))):
        with Locations((0, 6)):
            Circle(SKETCH18_R)
    extrude(amount=-CUT_EXTRUDE8_DEPTH, mode=Mode.SUBTRACT)

    # Sketch19 → Cut-Extrude9 (cut)
    with BuildSketch(Plane(origin=(22.5, 0, 0), x_dir=(0, 0, -1), z_dir=(1, 0, 0))):
        with Locations((-16, 6)):
            Circle(SKETCH19_R)
        with Locations((16, 6)):
            Circle(SKETCH19_R)
    extrude(amount=-CUT_EXTRUDE9_DEPTH, mode=Mode.SUBTRACT)

    # Sketch21 → Boss-Extrude2 (add)
    with BuildSketch(Plane(origin=(0, 15.99, 0), x_dir=(1, 0, 0), z_dir=(0, 1, 0))):
        with Locations((-18.005, 0)):
            Rectangle(SKETCH21_W, SKETCH21_H)
    extrude(amount=BOSS_EXTRUDE2_DEPTH)

    # Chamfer1
    chamfer1_edges = [part.edges().sort_by_distance(p)[0] for p in [
        (-22.5, 8.295, 25),
        (-22.5, 8.295, -25),
    ]]
    chamfer(chamfer1_edges, length=CHAMFER1_SIZE)

    # Fillet5
    fillet5_edges = [part.edges().sort_by_distance(p)[0] for p in [
        (-22.5, 16.59, 0),
    ]]
    fillet(fillet5_edges, radius=FILLET5_R)

    # Chamfer2
    chamfer2_edges = [part.edges().sort_by_distance(p)[0] for p in [
        (18.5, 12, 8),
        (18.5, 12, -8),
    ]]
    chamfer(chamfer2_edges, length=CHAMFER2_SIZE)


solid = part.part
